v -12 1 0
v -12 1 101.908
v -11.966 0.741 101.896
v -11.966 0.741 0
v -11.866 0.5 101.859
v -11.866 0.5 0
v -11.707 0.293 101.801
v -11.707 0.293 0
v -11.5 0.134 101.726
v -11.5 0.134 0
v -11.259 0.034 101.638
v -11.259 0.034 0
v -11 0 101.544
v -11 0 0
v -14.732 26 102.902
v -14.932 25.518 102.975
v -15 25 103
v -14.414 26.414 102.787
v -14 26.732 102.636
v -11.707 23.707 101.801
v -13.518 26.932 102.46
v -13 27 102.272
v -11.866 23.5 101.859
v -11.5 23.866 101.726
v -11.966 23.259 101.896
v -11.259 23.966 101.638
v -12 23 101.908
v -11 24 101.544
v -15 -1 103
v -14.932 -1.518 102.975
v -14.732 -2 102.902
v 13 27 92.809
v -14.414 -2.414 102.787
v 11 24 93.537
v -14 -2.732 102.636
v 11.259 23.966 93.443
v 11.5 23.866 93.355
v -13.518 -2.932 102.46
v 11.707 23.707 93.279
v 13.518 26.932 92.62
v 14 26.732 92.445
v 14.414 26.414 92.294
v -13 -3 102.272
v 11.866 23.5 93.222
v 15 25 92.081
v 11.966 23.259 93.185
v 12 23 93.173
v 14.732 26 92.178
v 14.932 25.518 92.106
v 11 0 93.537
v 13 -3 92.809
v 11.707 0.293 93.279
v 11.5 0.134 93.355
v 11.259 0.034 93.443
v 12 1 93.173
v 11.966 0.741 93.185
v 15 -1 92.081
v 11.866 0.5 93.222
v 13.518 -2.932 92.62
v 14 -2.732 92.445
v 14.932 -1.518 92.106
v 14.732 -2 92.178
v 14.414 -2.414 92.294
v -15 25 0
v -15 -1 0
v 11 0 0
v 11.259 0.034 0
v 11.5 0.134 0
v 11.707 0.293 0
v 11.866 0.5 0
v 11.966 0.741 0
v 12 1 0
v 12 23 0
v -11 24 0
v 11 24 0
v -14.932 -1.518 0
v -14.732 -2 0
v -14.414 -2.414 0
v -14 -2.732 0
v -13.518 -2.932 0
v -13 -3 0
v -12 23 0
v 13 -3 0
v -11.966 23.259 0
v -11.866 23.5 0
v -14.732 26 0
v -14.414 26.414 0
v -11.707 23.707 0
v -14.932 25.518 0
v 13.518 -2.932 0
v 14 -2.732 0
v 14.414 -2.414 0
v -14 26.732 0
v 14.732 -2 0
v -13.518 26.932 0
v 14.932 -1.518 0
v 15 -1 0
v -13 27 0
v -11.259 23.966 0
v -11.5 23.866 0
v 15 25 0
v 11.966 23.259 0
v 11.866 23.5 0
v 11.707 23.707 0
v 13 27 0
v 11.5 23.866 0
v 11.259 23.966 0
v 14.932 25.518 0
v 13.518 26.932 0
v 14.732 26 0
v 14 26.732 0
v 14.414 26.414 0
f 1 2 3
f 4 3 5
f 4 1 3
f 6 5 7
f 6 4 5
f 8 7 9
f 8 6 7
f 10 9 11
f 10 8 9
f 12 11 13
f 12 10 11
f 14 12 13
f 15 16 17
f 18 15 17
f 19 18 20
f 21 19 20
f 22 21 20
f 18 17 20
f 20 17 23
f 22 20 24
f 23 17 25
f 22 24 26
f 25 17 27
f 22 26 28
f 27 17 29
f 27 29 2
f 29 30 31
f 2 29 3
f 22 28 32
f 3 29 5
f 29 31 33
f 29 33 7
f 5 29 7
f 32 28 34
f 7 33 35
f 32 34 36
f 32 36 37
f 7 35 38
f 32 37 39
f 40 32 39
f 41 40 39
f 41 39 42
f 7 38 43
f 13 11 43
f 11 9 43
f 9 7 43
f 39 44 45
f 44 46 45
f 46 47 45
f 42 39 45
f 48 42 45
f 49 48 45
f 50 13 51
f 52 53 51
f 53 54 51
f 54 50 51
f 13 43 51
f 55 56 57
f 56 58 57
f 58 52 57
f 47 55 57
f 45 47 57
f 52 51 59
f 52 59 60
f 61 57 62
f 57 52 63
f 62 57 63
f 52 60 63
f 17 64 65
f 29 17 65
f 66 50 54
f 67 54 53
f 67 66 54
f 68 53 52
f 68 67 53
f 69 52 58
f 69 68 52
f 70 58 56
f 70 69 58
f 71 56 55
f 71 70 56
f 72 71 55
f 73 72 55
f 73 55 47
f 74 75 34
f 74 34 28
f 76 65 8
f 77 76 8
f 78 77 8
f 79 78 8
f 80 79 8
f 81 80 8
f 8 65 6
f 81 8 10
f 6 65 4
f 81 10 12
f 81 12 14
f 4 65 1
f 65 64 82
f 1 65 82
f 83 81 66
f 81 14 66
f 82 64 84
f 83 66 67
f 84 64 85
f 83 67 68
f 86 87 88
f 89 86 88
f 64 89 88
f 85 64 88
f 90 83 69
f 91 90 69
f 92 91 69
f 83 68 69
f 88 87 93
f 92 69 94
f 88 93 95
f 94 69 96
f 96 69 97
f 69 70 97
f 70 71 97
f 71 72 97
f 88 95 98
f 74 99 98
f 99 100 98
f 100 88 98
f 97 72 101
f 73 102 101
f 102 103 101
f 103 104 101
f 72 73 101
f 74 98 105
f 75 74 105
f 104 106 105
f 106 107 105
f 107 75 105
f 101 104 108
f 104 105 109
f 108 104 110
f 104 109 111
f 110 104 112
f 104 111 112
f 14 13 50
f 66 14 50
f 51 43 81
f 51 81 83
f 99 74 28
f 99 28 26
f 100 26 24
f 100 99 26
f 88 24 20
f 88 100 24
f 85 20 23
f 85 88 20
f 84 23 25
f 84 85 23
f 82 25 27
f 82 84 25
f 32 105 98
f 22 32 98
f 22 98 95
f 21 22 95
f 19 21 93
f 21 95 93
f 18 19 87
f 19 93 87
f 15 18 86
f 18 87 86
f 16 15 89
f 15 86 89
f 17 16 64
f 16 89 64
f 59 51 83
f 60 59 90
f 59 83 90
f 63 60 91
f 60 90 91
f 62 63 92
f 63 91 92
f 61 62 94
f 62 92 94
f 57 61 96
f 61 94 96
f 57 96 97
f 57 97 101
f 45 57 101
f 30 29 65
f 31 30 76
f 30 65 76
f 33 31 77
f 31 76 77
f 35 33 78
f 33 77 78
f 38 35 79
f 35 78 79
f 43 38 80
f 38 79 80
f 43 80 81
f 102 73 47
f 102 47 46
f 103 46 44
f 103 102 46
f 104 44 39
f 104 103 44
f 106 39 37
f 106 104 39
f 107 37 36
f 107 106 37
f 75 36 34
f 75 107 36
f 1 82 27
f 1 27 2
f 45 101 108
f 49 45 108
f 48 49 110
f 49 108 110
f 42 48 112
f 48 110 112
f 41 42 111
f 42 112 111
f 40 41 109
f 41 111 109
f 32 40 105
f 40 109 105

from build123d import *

# Parameters (mm, degrees)
DODANIE_WYCI_GNI_CIE1_DEPTH = 103
WYTNIJ_WYCI_GNI_CIE1_DEPTH  = 70


with BuildPart() as part:
    # Szkic1 → Dodanie-wyciągnięcie1 (new body)
    with BuildSketch(Plane.XY):
        with BuildLine():
            Line((-13, -3), (13, -3))
            ThreePointArc((13, -3), (14.414213562, -2.414213562), (15, -1))
            Line((15, -1), (15, 25))
            ThreePointArc((15, 25), (14.414213562, 26.414213562), (13, 27))
            Line((13, 27), (-13, 27))
            ThreePointArc((-13, 27), (-14.414213562, 26.414213562), (-15, 25))
            Line((-15, 25), (-15, -1))
            ThreePointArc((-15, -1), (-14.414213562, -2.414213562), (-13, -3))
        make_face()
        with BuildLine():
            Line((-11, 0), (11, 0))
            ThreePointArc((11, 0), (11.707106781, 0.292893219), (12, 1))
            Line((12, 1), (12, 23))
            ThreePointArc((12, 23), (11.707106781, 23.707106781), (11, 24))
            Line((11, 24), (-11, 24))
            ThreePointArc((-11, 24), (-11.707106781, 23.707106781), (-12, 23))
            Line((-12, 23), (-12, 1))
            ThreePointArc((-12, 1), (-11.707106781, 0.292893219), (-11, 0))
        make_face(mode=Mode.SUBTRACT)
    extrude(amount=DODANIE_WYCI_GNI_CIE1_DEPTH)

    # Szkic2 → Wytnij-wyciągnięcie1 (cut)
    with BuildSketch(Plane.XZ.offset(3)):
        Polygon((-15, 103), (66.156264481, 73.461535405), (66.156264481, 103), align=None)
    extrude(amount=-WYTNIJ_WYCI_GNI_CIE1_DEPTH, mode=Mode.SUBTRACT)


solid = part.part
